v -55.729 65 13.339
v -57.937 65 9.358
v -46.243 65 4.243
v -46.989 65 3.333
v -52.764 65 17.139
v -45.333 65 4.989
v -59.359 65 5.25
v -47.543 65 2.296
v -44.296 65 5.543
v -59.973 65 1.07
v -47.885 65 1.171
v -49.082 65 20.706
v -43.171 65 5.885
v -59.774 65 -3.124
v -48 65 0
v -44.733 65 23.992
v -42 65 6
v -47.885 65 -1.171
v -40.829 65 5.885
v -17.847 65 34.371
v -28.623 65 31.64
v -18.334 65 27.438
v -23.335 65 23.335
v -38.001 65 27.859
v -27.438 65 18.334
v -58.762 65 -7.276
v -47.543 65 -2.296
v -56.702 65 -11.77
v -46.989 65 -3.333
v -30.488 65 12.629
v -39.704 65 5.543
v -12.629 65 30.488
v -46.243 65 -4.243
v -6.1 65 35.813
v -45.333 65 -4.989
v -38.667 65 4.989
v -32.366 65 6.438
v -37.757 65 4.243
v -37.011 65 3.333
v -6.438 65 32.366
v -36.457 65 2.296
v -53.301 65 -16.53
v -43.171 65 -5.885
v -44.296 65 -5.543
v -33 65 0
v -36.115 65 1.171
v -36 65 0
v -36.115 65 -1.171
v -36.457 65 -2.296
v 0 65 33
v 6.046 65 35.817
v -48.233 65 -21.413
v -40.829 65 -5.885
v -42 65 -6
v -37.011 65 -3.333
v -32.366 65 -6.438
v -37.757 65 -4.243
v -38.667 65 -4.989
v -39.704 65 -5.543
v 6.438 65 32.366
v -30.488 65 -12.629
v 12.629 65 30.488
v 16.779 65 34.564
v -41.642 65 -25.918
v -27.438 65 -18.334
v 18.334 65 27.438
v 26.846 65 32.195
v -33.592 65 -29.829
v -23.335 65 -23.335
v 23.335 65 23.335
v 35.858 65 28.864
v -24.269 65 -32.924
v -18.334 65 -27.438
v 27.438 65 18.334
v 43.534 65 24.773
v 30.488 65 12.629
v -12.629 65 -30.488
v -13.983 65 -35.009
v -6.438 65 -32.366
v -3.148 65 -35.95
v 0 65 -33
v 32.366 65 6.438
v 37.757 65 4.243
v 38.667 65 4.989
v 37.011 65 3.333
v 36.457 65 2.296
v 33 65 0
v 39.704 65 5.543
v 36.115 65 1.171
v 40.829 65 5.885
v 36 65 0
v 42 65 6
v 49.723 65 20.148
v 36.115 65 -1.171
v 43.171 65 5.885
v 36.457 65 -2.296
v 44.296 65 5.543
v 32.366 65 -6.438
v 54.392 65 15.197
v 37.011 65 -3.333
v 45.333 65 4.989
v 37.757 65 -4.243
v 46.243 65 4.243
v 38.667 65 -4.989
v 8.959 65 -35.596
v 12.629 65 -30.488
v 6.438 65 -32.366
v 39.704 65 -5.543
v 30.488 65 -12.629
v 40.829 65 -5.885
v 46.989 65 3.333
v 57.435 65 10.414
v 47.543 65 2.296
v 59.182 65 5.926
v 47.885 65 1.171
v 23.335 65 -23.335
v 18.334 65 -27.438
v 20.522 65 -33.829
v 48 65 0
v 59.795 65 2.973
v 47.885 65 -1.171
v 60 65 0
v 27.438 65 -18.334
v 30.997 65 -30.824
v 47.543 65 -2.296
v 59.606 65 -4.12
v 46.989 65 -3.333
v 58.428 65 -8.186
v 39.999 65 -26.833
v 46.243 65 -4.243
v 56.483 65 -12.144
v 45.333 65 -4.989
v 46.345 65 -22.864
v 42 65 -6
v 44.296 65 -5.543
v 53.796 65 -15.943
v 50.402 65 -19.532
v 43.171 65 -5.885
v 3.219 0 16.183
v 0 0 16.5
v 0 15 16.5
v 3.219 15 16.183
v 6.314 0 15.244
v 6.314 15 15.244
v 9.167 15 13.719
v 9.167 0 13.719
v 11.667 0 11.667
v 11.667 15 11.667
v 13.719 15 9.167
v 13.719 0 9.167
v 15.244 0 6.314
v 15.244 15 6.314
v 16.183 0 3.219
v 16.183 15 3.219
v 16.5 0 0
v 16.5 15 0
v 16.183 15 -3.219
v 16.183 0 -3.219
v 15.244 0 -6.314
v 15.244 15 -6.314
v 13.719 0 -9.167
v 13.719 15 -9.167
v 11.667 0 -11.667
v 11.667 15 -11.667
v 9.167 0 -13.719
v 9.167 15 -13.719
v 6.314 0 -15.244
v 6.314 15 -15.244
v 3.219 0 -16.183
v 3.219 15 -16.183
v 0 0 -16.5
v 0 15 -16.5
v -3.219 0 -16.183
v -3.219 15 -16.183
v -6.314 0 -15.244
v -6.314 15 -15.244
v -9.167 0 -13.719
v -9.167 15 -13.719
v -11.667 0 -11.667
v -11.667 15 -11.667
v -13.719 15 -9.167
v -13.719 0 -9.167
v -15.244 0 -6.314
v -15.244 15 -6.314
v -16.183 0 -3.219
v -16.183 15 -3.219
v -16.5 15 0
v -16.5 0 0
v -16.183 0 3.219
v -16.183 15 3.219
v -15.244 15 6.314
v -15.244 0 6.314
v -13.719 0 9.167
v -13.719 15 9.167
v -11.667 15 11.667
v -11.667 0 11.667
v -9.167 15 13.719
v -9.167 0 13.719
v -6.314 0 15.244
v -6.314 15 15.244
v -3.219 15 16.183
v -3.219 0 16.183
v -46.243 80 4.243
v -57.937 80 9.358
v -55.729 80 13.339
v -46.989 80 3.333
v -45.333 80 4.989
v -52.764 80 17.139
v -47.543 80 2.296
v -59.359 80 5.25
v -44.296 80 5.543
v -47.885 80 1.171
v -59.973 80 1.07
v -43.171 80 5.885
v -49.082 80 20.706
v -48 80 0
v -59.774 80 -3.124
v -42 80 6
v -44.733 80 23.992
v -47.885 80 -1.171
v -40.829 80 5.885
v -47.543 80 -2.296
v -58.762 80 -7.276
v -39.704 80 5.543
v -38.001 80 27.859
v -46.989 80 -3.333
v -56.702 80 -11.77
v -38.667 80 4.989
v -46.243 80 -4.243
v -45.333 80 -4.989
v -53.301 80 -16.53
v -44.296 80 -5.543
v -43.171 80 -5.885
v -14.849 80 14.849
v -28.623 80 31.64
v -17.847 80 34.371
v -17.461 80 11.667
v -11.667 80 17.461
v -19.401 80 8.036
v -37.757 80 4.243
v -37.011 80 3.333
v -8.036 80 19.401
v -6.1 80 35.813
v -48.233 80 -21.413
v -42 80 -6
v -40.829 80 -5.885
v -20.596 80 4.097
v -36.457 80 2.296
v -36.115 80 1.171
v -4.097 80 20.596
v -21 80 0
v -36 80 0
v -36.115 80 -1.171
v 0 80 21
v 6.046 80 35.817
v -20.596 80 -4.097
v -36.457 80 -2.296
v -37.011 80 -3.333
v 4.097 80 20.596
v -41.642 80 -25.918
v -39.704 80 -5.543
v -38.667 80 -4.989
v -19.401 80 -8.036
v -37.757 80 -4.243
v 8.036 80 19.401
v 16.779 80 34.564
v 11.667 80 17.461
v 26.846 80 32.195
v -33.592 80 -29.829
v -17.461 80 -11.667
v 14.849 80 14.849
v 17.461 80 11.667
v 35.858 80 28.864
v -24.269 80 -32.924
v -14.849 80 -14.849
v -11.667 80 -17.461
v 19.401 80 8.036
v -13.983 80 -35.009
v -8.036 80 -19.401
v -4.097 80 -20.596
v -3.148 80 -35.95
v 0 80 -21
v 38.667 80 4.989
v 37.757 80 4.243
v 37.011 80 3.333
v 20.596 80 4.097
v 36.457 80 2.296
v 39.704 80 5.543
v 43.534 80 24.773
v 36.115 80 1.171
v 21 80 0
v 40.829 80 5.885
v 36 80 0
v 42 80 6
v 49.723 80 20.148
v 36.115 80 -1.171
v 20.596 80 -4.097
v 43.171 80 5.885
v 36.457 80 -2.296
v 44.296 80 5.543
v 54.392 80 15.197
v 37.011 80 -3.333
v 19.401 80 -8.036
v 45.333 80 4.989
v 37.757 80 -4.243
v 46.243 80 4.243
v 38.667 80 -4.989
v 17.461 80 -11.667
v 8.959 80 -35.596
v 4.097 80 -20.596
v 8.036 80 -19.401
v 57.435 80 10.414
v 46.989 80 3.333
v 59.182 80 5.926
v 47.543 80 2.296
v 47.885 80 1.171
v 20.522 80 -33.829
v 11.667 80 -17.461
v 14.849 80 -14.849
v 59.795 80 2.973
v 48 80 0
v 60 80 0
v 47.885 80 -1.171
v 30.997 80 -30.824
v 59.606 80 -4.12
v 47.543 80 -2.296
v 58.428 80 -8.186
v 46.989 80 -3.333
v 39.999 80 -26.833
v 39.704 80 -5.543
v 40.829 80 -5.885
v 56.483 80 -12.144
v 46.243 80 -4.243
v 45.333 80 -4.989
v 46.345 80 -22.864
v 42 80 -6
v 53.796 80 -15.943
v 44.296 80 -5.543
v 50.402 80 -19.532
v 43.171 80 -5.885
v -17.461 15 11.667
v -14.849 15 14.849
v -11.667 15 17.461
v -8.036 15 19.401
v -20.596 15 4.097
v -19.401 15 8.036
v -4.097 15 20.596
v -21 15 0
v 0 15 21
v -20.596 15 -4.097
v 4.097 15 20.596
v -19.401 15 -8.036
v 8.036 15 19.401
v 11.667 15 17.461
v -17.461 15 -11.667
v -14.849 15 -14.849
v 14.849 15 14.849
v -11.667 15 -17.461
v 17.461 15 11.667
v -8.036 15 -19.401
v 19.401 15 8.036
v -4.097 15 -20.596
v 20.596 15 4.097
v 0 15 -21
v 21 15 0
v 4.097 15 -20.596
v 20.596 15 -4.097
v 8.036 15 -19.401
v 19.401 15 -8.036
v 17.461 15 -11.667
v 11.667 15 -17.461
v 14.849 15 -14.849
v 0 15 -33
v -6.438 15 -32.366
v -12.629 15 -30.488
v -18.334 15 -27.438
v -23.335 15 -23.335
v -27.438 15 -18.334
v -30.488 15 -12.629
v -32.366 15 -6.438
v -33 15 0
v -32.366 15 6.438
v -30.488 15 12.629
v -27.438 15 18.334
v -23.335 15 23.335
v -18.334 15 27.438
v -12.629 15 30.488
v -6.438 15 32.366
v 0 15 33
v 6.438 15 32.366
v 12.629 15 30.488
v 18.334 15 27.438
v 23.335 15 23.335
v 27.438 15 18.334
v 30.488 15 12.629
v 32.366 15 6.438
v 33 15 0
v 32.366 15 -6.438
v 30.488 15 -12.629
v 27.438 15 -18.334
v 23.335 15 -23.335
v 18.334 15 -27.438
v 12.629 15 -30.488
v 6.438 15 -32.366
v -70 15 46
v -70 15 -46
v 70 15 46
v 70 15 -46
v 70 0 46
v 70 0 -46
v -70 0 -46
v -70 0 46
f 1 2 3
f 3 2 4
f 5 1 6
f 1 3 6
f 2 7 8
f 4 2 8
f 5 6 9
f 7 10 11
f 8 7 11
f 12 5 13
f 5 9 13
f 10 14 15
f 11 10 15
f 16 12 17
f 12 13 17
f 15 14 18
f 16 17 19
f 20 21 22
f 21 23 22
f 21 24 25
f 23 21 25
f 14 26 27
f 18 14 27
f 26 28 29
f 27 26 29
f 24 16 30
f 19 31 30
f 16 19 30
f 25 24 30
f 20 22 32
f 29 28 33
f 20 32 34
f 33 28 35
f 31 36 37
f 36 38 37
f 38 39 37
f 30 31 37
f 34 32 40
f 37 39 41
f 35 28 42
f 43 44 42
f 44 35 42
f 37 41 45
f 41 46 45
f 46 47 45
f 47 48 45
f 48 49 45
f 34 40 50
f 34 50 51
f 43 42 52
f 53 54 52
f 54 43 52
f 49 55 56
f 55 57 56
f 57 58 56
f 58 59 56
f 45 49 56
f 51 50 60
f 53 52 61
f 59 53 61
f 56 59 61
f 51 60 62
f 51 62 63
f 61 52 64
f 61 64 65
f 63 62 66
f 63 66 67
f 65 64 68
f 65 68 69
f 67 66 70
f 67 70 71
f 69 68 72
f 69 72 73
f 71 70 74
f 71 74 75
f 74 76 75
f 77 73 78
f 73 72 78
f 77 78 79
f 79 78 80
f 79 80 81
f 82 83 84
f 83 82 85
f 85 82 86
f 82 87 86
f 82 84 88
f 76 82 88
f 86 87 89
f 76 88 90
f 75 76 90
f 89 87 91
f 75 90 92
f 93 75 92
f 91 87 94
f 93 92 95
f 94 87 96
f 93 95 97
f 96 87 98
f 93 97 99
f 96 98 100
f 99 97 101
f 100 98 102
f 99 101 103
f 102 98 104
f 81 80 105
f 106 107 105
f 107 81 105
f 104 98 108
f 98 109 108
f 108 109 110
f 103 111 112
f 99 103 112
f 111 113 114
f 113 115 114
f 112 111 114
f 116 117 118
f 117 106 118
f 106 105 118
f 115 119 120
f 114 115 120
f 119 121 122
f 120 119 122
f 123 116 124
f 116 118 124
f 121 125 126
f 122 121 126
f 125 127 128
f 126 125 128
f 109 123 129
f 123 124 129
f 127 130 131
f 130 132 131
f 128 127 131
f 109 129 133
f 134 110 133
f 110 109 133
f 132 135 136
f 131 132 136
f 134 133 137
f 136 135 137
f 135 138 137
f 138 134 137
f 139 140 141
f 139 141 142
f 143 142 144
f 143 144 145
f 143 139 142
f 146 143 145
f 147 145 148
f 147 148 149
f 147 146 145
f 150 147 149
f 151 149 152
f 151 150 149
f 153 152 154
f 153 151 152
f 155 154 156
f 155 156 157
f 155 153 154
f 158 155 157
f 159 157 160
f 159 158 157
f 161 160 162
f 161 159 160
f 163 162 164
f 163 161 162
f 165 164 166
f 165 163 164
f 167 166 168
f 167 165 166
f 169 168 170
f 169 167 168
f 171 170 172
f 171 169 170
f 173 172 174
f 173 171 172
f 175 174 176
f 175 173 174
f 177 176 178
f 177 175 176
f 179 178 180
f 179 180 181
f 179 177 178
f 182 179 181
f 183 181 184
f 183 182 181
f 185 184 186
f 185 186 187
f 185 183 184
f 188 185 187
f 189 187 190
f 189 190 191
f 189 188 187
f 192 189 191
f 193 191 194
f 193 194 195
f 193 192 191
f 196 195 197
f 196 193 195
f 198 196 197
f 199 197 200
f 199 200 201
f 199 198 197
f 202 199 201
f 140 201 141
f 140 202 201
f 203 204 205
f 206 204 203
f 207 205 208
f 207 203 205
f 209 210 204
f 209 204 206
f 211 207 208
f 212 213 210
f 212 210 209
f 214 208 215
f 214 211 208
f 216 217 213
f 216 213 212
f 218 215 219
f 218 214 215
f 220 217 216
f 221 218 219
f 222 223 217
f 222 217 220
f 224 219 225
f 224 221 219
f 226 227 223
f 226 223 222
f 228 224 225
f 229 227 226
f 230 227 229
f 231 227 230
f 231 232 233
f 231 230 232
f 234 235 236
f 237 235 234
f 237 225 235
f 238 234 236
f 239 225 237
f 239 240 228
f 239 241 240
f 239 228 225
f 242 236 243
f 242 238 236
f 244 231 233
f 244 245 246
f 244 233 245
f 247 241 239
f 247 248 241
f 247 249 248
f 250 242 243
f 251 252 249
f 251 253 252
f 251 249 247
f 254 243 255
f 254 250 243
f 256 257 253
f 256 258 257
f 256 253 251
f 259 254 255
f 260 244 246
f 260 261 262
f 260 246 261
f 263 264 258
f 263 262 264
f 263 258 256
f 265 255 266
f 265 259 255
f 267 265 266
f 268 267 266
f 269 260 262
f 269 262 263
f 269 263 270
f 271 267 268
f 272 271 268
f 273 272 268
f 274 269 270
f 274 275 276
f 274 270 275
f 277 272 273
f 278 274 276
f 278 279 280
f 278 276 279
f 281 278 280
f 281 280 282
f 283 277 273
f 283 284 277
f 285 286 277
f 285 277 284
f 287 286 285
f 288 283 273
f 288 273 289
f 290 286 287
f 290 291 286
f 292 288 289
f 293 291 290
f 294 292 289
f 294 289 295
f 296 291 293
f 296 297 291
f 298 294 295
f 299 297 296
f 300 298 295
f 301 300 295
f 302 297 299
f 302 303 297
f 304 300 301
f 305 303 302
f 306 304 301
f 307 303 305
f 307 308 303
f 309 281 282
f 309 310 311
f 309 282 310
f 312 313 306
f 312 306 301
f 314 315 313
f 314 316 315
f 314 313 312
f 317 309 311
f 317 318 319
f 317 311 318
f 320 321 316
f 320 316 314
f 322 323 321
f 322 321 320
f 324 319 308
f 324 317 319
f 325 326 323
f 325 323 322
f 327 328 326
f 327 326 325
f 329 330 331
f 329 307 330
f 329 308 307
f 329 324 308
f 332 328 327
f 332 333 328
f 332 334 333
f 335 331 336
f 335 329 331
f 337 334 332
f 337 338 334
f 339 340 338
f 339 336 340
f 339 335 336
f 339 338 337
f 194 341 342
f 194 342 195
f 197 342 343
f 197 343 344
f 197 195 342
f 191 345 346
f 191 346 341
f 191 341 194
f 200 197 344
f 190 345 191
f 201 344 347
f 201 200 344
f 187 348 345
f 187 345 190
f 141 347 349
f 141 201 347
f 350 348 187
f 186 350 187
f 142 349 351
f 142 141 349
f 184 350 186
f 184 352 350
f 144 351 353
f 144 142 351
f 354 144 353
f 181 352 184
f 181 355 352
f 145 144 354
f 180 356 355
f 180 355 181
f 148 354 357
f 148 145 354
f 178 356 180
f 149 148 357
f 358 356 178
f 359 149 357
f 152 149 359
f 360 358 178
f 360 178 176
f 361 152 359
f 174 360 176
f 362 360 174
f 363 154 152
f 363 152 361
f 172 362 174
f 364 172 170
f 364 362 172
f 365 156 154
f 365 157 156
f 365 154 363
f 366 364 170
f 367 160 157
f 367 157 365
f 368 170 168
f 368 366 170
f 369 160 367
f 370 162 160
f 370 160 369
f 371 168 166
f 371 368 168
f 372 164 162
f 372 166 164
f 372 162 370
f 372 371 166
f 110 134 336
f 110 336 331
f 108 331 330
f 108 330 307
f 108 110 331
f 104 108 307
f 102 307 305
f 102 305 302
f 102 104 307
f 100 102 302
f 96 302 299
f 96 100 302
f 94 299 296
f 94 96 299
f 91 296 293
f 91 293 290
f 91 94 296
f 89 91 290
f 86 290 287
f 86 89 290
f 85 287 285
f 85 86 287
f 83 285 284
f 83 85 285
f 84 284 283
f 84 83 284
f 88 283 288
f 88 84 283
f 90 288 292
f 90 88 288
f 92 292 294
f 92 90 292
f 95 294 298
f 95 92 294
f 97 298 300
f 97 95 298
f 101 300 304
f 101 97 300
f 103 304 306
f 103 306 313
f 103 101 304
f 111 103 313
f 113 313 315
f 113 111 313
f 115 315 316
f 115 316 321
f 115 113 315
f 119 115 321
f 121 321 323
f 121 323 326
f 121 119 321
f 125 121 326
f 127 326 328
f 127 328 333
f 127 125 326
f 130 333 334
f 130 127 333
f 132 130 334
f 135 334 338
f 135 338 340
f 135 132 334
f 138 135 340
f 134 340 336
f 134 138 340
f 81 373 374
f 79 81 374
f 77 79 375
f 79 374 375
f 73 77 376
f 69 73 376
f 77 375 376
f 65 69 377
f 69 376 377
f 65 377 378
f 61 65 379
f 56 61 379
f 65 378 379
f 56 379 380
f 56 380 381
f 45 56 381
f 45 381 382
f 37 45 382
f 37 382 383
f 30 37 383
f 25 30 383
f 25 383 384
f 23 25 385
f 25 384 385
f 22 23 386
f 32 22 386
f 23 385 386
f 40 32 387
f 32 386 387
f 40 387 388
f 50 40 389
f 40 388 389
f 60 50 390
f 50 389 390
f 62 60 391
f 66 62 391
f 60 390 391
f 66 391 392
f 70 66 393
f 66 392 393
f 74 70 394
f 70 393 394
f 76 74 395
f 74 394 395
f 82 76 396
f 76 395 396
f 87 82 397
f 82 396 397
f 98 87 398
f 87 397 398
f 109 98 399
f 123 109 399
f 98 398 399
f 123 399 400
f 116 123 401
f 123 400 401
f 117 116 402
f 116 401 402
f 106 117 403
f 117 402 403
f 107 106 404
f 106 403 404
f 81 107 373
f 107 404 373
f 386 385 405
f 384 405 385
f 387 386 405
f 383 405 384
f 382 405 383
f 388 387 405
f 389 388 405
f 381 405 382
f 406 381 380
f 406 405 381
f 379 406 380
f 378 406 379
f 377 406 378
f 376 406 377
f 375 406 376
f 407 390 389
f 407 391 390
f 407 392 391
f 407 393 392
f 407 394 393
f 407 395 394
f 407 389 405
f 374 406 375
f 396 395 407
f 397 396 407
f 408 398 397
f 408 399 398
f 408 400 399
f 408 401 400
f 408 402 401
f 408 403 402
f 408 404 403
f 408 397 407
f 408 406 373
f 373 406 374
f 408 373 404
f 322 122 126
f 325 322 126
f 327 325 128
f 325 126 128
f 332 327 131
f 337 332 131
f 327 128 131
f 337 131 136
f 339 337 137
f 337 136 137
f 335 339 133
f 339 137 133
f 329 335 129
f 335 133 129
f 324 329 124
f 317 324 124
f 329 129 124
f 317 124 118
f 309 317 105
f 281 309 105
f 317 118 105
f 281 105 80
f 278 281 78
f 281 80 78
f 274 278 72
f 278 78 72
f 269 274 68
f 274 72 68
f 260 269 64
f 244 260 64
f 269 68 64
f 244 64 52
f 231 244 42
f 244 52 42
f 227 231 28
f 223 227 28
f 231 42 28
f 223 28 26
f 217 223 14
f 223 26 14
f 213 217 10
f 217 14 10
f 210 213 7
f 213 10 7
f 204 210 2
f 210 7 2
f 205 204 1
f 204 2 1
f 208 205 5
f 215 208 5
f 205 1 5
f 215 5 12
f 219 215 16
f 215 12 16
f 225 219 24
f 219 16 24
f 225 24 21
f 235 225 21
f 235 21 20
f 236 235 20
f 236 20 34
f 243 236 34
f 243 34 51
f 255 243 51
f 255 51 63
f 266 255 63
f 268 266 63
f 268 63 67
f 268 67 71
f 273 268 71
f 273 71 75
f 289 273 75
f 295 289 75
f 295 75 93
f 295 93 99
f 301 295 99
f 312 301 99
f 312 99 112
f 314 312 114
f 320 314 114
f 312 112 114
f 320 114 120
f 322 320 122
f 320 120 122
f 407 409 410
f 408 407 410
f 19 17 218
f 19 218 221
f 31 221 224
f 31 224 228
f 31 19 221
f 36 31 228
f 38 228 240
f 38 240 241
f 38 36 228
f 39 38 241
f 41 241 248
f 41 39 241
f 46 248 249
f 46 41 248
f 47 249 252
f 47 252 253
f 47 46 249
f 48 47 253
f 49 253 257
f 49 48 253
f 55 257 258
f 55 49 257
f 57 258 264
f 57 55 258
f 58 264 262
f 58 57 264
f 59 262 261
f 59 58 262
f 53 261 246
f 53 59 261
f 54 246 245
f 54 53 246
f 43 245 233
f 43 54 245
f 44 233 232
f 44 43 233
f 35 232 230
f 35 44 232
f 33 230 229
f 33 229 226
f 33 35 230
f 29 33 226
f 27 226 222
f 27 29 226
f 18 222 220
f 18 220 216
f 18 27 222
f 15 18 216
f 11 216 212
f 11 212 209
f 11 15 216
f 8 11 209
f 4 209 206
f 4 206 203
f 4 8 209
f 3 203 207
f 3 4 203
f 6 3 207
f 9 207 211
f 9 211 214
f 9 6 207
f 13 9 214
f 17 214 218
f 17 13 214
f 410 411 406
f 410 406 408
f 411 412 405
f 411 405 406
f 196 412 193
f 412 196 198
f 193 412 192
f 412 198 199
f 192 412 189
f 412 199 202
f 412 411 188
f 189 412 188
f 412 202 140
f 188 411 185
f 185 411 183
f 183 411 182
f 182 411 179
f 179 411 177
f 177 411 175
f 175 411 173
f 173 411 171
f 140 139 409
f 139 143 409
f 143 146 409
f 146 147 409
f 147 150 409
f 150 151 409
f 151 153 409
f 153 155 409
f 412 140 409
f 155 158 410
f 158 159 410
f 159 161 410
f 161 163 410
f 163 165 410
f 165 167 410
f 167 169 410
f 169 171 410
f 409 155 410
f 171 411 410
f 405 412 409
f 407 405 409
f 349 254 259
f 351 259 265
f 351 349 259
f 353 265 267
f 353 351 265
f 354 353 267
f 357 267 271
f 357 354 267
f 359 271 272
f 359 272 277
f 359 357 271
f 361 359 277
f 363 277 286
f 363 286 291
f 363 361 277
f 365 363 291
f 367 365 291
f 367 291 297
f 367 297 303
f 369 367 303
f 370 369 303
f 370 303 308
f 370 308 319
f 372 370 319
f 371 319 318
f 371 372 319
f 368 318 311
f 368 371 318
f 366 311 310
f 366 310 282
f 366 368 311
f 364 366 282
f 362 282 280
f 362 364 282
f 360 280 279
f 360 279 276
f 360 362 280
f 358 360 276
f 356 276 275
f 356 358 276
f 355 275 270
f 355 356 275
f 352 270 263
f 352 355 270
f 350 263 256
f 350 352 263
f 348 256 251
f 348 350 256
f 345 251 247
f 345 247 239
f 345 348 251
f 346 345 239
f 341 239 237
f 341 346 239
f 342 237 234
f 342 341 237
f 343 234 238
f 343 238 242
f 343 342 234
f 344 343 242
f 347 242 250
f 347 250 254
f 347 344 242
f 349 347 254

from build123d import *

# Parameters (mm, degrees)
SKETCH1_W           = 140
SKETCH1_H           = 92
SKETCH1_R           = 16.5
BOSS_EXTRUDE2_DEPTH = 15
SKETCH3_R           = 33
SKETCH3_R_2         = 21
BOSS_EXTRUDE3_DEPTH = 50
SKETCH4_RX          = 60
SKETCH4_RY          = 36
SKETCH4_R           = 6
SKETCH4_R_2         = 21
BOSS_EXTRUDE4_DEPTH = 15


with BuildPart() as part:
    # Sketch1 → Boss-Extrude2 (new body)
    with BuildSketch(Plane(origin=(0, 0, 0), x_dir=(1, 0, 0), z_dir=(0, 1, 0))):
        Rectangle(SKETCH1_W, SKETCH1_H)
        with Locations(Location((0, 0, 0), (0, 0, 270))):
            Circle(SKETCH1_R, mode=Mode.SUBTRACT)
    extrude(amount=BOSS_EXTRUDE2_DEPTH)

    # Sketch3 → Boss-Extrude3 (add)
    with BuildSketch(Plane(origin=(0, 15, 0), x_dir=(1, 0, 0), z_dir=(0, 1, 0))):
        with Locations(Location((0, 0, 0), (0, 0, 90))):
            Circle(SKETCH3_R)
        with Locations(Location((0, 0, 0), (0, 0, 270))):
            Circle(SKETCH3_R_2, mode=Mode.SUBTRACT)
    extrude(amount=BOSS_EXTRUDE3_DEPTH)

    # Sketch4 → Boss-Extrude4 (add)
    with BuildSketch(Plane(origin=(0, 65, 0), x_dir=(1, 0, 0), z_dir=(0, 1, 0))):
        with Locations((0, 0)):
            Ellipse(SKETCH4_RX, SKETCH4_RY)
        with Locations(Location((-42, 0, 0), (0, 0, 270))):
            Circle(SKETCH4_R, mode=Mode.SUBTRACT)
        with Locations(Location((42, 0, 0), (0, 0, 90))):
            Circle(SKETCH4_R, mode=Mode.SUBTRACT)
        with Locations(Location((0, 0, 0), (0, 0, 270))):
            Circle(SKETCH4_R_2, mode=Mode.SUBTRACT)
    extrude(amount=BOSS_EXTRUDE4_DEPTH)


solid = part.part
